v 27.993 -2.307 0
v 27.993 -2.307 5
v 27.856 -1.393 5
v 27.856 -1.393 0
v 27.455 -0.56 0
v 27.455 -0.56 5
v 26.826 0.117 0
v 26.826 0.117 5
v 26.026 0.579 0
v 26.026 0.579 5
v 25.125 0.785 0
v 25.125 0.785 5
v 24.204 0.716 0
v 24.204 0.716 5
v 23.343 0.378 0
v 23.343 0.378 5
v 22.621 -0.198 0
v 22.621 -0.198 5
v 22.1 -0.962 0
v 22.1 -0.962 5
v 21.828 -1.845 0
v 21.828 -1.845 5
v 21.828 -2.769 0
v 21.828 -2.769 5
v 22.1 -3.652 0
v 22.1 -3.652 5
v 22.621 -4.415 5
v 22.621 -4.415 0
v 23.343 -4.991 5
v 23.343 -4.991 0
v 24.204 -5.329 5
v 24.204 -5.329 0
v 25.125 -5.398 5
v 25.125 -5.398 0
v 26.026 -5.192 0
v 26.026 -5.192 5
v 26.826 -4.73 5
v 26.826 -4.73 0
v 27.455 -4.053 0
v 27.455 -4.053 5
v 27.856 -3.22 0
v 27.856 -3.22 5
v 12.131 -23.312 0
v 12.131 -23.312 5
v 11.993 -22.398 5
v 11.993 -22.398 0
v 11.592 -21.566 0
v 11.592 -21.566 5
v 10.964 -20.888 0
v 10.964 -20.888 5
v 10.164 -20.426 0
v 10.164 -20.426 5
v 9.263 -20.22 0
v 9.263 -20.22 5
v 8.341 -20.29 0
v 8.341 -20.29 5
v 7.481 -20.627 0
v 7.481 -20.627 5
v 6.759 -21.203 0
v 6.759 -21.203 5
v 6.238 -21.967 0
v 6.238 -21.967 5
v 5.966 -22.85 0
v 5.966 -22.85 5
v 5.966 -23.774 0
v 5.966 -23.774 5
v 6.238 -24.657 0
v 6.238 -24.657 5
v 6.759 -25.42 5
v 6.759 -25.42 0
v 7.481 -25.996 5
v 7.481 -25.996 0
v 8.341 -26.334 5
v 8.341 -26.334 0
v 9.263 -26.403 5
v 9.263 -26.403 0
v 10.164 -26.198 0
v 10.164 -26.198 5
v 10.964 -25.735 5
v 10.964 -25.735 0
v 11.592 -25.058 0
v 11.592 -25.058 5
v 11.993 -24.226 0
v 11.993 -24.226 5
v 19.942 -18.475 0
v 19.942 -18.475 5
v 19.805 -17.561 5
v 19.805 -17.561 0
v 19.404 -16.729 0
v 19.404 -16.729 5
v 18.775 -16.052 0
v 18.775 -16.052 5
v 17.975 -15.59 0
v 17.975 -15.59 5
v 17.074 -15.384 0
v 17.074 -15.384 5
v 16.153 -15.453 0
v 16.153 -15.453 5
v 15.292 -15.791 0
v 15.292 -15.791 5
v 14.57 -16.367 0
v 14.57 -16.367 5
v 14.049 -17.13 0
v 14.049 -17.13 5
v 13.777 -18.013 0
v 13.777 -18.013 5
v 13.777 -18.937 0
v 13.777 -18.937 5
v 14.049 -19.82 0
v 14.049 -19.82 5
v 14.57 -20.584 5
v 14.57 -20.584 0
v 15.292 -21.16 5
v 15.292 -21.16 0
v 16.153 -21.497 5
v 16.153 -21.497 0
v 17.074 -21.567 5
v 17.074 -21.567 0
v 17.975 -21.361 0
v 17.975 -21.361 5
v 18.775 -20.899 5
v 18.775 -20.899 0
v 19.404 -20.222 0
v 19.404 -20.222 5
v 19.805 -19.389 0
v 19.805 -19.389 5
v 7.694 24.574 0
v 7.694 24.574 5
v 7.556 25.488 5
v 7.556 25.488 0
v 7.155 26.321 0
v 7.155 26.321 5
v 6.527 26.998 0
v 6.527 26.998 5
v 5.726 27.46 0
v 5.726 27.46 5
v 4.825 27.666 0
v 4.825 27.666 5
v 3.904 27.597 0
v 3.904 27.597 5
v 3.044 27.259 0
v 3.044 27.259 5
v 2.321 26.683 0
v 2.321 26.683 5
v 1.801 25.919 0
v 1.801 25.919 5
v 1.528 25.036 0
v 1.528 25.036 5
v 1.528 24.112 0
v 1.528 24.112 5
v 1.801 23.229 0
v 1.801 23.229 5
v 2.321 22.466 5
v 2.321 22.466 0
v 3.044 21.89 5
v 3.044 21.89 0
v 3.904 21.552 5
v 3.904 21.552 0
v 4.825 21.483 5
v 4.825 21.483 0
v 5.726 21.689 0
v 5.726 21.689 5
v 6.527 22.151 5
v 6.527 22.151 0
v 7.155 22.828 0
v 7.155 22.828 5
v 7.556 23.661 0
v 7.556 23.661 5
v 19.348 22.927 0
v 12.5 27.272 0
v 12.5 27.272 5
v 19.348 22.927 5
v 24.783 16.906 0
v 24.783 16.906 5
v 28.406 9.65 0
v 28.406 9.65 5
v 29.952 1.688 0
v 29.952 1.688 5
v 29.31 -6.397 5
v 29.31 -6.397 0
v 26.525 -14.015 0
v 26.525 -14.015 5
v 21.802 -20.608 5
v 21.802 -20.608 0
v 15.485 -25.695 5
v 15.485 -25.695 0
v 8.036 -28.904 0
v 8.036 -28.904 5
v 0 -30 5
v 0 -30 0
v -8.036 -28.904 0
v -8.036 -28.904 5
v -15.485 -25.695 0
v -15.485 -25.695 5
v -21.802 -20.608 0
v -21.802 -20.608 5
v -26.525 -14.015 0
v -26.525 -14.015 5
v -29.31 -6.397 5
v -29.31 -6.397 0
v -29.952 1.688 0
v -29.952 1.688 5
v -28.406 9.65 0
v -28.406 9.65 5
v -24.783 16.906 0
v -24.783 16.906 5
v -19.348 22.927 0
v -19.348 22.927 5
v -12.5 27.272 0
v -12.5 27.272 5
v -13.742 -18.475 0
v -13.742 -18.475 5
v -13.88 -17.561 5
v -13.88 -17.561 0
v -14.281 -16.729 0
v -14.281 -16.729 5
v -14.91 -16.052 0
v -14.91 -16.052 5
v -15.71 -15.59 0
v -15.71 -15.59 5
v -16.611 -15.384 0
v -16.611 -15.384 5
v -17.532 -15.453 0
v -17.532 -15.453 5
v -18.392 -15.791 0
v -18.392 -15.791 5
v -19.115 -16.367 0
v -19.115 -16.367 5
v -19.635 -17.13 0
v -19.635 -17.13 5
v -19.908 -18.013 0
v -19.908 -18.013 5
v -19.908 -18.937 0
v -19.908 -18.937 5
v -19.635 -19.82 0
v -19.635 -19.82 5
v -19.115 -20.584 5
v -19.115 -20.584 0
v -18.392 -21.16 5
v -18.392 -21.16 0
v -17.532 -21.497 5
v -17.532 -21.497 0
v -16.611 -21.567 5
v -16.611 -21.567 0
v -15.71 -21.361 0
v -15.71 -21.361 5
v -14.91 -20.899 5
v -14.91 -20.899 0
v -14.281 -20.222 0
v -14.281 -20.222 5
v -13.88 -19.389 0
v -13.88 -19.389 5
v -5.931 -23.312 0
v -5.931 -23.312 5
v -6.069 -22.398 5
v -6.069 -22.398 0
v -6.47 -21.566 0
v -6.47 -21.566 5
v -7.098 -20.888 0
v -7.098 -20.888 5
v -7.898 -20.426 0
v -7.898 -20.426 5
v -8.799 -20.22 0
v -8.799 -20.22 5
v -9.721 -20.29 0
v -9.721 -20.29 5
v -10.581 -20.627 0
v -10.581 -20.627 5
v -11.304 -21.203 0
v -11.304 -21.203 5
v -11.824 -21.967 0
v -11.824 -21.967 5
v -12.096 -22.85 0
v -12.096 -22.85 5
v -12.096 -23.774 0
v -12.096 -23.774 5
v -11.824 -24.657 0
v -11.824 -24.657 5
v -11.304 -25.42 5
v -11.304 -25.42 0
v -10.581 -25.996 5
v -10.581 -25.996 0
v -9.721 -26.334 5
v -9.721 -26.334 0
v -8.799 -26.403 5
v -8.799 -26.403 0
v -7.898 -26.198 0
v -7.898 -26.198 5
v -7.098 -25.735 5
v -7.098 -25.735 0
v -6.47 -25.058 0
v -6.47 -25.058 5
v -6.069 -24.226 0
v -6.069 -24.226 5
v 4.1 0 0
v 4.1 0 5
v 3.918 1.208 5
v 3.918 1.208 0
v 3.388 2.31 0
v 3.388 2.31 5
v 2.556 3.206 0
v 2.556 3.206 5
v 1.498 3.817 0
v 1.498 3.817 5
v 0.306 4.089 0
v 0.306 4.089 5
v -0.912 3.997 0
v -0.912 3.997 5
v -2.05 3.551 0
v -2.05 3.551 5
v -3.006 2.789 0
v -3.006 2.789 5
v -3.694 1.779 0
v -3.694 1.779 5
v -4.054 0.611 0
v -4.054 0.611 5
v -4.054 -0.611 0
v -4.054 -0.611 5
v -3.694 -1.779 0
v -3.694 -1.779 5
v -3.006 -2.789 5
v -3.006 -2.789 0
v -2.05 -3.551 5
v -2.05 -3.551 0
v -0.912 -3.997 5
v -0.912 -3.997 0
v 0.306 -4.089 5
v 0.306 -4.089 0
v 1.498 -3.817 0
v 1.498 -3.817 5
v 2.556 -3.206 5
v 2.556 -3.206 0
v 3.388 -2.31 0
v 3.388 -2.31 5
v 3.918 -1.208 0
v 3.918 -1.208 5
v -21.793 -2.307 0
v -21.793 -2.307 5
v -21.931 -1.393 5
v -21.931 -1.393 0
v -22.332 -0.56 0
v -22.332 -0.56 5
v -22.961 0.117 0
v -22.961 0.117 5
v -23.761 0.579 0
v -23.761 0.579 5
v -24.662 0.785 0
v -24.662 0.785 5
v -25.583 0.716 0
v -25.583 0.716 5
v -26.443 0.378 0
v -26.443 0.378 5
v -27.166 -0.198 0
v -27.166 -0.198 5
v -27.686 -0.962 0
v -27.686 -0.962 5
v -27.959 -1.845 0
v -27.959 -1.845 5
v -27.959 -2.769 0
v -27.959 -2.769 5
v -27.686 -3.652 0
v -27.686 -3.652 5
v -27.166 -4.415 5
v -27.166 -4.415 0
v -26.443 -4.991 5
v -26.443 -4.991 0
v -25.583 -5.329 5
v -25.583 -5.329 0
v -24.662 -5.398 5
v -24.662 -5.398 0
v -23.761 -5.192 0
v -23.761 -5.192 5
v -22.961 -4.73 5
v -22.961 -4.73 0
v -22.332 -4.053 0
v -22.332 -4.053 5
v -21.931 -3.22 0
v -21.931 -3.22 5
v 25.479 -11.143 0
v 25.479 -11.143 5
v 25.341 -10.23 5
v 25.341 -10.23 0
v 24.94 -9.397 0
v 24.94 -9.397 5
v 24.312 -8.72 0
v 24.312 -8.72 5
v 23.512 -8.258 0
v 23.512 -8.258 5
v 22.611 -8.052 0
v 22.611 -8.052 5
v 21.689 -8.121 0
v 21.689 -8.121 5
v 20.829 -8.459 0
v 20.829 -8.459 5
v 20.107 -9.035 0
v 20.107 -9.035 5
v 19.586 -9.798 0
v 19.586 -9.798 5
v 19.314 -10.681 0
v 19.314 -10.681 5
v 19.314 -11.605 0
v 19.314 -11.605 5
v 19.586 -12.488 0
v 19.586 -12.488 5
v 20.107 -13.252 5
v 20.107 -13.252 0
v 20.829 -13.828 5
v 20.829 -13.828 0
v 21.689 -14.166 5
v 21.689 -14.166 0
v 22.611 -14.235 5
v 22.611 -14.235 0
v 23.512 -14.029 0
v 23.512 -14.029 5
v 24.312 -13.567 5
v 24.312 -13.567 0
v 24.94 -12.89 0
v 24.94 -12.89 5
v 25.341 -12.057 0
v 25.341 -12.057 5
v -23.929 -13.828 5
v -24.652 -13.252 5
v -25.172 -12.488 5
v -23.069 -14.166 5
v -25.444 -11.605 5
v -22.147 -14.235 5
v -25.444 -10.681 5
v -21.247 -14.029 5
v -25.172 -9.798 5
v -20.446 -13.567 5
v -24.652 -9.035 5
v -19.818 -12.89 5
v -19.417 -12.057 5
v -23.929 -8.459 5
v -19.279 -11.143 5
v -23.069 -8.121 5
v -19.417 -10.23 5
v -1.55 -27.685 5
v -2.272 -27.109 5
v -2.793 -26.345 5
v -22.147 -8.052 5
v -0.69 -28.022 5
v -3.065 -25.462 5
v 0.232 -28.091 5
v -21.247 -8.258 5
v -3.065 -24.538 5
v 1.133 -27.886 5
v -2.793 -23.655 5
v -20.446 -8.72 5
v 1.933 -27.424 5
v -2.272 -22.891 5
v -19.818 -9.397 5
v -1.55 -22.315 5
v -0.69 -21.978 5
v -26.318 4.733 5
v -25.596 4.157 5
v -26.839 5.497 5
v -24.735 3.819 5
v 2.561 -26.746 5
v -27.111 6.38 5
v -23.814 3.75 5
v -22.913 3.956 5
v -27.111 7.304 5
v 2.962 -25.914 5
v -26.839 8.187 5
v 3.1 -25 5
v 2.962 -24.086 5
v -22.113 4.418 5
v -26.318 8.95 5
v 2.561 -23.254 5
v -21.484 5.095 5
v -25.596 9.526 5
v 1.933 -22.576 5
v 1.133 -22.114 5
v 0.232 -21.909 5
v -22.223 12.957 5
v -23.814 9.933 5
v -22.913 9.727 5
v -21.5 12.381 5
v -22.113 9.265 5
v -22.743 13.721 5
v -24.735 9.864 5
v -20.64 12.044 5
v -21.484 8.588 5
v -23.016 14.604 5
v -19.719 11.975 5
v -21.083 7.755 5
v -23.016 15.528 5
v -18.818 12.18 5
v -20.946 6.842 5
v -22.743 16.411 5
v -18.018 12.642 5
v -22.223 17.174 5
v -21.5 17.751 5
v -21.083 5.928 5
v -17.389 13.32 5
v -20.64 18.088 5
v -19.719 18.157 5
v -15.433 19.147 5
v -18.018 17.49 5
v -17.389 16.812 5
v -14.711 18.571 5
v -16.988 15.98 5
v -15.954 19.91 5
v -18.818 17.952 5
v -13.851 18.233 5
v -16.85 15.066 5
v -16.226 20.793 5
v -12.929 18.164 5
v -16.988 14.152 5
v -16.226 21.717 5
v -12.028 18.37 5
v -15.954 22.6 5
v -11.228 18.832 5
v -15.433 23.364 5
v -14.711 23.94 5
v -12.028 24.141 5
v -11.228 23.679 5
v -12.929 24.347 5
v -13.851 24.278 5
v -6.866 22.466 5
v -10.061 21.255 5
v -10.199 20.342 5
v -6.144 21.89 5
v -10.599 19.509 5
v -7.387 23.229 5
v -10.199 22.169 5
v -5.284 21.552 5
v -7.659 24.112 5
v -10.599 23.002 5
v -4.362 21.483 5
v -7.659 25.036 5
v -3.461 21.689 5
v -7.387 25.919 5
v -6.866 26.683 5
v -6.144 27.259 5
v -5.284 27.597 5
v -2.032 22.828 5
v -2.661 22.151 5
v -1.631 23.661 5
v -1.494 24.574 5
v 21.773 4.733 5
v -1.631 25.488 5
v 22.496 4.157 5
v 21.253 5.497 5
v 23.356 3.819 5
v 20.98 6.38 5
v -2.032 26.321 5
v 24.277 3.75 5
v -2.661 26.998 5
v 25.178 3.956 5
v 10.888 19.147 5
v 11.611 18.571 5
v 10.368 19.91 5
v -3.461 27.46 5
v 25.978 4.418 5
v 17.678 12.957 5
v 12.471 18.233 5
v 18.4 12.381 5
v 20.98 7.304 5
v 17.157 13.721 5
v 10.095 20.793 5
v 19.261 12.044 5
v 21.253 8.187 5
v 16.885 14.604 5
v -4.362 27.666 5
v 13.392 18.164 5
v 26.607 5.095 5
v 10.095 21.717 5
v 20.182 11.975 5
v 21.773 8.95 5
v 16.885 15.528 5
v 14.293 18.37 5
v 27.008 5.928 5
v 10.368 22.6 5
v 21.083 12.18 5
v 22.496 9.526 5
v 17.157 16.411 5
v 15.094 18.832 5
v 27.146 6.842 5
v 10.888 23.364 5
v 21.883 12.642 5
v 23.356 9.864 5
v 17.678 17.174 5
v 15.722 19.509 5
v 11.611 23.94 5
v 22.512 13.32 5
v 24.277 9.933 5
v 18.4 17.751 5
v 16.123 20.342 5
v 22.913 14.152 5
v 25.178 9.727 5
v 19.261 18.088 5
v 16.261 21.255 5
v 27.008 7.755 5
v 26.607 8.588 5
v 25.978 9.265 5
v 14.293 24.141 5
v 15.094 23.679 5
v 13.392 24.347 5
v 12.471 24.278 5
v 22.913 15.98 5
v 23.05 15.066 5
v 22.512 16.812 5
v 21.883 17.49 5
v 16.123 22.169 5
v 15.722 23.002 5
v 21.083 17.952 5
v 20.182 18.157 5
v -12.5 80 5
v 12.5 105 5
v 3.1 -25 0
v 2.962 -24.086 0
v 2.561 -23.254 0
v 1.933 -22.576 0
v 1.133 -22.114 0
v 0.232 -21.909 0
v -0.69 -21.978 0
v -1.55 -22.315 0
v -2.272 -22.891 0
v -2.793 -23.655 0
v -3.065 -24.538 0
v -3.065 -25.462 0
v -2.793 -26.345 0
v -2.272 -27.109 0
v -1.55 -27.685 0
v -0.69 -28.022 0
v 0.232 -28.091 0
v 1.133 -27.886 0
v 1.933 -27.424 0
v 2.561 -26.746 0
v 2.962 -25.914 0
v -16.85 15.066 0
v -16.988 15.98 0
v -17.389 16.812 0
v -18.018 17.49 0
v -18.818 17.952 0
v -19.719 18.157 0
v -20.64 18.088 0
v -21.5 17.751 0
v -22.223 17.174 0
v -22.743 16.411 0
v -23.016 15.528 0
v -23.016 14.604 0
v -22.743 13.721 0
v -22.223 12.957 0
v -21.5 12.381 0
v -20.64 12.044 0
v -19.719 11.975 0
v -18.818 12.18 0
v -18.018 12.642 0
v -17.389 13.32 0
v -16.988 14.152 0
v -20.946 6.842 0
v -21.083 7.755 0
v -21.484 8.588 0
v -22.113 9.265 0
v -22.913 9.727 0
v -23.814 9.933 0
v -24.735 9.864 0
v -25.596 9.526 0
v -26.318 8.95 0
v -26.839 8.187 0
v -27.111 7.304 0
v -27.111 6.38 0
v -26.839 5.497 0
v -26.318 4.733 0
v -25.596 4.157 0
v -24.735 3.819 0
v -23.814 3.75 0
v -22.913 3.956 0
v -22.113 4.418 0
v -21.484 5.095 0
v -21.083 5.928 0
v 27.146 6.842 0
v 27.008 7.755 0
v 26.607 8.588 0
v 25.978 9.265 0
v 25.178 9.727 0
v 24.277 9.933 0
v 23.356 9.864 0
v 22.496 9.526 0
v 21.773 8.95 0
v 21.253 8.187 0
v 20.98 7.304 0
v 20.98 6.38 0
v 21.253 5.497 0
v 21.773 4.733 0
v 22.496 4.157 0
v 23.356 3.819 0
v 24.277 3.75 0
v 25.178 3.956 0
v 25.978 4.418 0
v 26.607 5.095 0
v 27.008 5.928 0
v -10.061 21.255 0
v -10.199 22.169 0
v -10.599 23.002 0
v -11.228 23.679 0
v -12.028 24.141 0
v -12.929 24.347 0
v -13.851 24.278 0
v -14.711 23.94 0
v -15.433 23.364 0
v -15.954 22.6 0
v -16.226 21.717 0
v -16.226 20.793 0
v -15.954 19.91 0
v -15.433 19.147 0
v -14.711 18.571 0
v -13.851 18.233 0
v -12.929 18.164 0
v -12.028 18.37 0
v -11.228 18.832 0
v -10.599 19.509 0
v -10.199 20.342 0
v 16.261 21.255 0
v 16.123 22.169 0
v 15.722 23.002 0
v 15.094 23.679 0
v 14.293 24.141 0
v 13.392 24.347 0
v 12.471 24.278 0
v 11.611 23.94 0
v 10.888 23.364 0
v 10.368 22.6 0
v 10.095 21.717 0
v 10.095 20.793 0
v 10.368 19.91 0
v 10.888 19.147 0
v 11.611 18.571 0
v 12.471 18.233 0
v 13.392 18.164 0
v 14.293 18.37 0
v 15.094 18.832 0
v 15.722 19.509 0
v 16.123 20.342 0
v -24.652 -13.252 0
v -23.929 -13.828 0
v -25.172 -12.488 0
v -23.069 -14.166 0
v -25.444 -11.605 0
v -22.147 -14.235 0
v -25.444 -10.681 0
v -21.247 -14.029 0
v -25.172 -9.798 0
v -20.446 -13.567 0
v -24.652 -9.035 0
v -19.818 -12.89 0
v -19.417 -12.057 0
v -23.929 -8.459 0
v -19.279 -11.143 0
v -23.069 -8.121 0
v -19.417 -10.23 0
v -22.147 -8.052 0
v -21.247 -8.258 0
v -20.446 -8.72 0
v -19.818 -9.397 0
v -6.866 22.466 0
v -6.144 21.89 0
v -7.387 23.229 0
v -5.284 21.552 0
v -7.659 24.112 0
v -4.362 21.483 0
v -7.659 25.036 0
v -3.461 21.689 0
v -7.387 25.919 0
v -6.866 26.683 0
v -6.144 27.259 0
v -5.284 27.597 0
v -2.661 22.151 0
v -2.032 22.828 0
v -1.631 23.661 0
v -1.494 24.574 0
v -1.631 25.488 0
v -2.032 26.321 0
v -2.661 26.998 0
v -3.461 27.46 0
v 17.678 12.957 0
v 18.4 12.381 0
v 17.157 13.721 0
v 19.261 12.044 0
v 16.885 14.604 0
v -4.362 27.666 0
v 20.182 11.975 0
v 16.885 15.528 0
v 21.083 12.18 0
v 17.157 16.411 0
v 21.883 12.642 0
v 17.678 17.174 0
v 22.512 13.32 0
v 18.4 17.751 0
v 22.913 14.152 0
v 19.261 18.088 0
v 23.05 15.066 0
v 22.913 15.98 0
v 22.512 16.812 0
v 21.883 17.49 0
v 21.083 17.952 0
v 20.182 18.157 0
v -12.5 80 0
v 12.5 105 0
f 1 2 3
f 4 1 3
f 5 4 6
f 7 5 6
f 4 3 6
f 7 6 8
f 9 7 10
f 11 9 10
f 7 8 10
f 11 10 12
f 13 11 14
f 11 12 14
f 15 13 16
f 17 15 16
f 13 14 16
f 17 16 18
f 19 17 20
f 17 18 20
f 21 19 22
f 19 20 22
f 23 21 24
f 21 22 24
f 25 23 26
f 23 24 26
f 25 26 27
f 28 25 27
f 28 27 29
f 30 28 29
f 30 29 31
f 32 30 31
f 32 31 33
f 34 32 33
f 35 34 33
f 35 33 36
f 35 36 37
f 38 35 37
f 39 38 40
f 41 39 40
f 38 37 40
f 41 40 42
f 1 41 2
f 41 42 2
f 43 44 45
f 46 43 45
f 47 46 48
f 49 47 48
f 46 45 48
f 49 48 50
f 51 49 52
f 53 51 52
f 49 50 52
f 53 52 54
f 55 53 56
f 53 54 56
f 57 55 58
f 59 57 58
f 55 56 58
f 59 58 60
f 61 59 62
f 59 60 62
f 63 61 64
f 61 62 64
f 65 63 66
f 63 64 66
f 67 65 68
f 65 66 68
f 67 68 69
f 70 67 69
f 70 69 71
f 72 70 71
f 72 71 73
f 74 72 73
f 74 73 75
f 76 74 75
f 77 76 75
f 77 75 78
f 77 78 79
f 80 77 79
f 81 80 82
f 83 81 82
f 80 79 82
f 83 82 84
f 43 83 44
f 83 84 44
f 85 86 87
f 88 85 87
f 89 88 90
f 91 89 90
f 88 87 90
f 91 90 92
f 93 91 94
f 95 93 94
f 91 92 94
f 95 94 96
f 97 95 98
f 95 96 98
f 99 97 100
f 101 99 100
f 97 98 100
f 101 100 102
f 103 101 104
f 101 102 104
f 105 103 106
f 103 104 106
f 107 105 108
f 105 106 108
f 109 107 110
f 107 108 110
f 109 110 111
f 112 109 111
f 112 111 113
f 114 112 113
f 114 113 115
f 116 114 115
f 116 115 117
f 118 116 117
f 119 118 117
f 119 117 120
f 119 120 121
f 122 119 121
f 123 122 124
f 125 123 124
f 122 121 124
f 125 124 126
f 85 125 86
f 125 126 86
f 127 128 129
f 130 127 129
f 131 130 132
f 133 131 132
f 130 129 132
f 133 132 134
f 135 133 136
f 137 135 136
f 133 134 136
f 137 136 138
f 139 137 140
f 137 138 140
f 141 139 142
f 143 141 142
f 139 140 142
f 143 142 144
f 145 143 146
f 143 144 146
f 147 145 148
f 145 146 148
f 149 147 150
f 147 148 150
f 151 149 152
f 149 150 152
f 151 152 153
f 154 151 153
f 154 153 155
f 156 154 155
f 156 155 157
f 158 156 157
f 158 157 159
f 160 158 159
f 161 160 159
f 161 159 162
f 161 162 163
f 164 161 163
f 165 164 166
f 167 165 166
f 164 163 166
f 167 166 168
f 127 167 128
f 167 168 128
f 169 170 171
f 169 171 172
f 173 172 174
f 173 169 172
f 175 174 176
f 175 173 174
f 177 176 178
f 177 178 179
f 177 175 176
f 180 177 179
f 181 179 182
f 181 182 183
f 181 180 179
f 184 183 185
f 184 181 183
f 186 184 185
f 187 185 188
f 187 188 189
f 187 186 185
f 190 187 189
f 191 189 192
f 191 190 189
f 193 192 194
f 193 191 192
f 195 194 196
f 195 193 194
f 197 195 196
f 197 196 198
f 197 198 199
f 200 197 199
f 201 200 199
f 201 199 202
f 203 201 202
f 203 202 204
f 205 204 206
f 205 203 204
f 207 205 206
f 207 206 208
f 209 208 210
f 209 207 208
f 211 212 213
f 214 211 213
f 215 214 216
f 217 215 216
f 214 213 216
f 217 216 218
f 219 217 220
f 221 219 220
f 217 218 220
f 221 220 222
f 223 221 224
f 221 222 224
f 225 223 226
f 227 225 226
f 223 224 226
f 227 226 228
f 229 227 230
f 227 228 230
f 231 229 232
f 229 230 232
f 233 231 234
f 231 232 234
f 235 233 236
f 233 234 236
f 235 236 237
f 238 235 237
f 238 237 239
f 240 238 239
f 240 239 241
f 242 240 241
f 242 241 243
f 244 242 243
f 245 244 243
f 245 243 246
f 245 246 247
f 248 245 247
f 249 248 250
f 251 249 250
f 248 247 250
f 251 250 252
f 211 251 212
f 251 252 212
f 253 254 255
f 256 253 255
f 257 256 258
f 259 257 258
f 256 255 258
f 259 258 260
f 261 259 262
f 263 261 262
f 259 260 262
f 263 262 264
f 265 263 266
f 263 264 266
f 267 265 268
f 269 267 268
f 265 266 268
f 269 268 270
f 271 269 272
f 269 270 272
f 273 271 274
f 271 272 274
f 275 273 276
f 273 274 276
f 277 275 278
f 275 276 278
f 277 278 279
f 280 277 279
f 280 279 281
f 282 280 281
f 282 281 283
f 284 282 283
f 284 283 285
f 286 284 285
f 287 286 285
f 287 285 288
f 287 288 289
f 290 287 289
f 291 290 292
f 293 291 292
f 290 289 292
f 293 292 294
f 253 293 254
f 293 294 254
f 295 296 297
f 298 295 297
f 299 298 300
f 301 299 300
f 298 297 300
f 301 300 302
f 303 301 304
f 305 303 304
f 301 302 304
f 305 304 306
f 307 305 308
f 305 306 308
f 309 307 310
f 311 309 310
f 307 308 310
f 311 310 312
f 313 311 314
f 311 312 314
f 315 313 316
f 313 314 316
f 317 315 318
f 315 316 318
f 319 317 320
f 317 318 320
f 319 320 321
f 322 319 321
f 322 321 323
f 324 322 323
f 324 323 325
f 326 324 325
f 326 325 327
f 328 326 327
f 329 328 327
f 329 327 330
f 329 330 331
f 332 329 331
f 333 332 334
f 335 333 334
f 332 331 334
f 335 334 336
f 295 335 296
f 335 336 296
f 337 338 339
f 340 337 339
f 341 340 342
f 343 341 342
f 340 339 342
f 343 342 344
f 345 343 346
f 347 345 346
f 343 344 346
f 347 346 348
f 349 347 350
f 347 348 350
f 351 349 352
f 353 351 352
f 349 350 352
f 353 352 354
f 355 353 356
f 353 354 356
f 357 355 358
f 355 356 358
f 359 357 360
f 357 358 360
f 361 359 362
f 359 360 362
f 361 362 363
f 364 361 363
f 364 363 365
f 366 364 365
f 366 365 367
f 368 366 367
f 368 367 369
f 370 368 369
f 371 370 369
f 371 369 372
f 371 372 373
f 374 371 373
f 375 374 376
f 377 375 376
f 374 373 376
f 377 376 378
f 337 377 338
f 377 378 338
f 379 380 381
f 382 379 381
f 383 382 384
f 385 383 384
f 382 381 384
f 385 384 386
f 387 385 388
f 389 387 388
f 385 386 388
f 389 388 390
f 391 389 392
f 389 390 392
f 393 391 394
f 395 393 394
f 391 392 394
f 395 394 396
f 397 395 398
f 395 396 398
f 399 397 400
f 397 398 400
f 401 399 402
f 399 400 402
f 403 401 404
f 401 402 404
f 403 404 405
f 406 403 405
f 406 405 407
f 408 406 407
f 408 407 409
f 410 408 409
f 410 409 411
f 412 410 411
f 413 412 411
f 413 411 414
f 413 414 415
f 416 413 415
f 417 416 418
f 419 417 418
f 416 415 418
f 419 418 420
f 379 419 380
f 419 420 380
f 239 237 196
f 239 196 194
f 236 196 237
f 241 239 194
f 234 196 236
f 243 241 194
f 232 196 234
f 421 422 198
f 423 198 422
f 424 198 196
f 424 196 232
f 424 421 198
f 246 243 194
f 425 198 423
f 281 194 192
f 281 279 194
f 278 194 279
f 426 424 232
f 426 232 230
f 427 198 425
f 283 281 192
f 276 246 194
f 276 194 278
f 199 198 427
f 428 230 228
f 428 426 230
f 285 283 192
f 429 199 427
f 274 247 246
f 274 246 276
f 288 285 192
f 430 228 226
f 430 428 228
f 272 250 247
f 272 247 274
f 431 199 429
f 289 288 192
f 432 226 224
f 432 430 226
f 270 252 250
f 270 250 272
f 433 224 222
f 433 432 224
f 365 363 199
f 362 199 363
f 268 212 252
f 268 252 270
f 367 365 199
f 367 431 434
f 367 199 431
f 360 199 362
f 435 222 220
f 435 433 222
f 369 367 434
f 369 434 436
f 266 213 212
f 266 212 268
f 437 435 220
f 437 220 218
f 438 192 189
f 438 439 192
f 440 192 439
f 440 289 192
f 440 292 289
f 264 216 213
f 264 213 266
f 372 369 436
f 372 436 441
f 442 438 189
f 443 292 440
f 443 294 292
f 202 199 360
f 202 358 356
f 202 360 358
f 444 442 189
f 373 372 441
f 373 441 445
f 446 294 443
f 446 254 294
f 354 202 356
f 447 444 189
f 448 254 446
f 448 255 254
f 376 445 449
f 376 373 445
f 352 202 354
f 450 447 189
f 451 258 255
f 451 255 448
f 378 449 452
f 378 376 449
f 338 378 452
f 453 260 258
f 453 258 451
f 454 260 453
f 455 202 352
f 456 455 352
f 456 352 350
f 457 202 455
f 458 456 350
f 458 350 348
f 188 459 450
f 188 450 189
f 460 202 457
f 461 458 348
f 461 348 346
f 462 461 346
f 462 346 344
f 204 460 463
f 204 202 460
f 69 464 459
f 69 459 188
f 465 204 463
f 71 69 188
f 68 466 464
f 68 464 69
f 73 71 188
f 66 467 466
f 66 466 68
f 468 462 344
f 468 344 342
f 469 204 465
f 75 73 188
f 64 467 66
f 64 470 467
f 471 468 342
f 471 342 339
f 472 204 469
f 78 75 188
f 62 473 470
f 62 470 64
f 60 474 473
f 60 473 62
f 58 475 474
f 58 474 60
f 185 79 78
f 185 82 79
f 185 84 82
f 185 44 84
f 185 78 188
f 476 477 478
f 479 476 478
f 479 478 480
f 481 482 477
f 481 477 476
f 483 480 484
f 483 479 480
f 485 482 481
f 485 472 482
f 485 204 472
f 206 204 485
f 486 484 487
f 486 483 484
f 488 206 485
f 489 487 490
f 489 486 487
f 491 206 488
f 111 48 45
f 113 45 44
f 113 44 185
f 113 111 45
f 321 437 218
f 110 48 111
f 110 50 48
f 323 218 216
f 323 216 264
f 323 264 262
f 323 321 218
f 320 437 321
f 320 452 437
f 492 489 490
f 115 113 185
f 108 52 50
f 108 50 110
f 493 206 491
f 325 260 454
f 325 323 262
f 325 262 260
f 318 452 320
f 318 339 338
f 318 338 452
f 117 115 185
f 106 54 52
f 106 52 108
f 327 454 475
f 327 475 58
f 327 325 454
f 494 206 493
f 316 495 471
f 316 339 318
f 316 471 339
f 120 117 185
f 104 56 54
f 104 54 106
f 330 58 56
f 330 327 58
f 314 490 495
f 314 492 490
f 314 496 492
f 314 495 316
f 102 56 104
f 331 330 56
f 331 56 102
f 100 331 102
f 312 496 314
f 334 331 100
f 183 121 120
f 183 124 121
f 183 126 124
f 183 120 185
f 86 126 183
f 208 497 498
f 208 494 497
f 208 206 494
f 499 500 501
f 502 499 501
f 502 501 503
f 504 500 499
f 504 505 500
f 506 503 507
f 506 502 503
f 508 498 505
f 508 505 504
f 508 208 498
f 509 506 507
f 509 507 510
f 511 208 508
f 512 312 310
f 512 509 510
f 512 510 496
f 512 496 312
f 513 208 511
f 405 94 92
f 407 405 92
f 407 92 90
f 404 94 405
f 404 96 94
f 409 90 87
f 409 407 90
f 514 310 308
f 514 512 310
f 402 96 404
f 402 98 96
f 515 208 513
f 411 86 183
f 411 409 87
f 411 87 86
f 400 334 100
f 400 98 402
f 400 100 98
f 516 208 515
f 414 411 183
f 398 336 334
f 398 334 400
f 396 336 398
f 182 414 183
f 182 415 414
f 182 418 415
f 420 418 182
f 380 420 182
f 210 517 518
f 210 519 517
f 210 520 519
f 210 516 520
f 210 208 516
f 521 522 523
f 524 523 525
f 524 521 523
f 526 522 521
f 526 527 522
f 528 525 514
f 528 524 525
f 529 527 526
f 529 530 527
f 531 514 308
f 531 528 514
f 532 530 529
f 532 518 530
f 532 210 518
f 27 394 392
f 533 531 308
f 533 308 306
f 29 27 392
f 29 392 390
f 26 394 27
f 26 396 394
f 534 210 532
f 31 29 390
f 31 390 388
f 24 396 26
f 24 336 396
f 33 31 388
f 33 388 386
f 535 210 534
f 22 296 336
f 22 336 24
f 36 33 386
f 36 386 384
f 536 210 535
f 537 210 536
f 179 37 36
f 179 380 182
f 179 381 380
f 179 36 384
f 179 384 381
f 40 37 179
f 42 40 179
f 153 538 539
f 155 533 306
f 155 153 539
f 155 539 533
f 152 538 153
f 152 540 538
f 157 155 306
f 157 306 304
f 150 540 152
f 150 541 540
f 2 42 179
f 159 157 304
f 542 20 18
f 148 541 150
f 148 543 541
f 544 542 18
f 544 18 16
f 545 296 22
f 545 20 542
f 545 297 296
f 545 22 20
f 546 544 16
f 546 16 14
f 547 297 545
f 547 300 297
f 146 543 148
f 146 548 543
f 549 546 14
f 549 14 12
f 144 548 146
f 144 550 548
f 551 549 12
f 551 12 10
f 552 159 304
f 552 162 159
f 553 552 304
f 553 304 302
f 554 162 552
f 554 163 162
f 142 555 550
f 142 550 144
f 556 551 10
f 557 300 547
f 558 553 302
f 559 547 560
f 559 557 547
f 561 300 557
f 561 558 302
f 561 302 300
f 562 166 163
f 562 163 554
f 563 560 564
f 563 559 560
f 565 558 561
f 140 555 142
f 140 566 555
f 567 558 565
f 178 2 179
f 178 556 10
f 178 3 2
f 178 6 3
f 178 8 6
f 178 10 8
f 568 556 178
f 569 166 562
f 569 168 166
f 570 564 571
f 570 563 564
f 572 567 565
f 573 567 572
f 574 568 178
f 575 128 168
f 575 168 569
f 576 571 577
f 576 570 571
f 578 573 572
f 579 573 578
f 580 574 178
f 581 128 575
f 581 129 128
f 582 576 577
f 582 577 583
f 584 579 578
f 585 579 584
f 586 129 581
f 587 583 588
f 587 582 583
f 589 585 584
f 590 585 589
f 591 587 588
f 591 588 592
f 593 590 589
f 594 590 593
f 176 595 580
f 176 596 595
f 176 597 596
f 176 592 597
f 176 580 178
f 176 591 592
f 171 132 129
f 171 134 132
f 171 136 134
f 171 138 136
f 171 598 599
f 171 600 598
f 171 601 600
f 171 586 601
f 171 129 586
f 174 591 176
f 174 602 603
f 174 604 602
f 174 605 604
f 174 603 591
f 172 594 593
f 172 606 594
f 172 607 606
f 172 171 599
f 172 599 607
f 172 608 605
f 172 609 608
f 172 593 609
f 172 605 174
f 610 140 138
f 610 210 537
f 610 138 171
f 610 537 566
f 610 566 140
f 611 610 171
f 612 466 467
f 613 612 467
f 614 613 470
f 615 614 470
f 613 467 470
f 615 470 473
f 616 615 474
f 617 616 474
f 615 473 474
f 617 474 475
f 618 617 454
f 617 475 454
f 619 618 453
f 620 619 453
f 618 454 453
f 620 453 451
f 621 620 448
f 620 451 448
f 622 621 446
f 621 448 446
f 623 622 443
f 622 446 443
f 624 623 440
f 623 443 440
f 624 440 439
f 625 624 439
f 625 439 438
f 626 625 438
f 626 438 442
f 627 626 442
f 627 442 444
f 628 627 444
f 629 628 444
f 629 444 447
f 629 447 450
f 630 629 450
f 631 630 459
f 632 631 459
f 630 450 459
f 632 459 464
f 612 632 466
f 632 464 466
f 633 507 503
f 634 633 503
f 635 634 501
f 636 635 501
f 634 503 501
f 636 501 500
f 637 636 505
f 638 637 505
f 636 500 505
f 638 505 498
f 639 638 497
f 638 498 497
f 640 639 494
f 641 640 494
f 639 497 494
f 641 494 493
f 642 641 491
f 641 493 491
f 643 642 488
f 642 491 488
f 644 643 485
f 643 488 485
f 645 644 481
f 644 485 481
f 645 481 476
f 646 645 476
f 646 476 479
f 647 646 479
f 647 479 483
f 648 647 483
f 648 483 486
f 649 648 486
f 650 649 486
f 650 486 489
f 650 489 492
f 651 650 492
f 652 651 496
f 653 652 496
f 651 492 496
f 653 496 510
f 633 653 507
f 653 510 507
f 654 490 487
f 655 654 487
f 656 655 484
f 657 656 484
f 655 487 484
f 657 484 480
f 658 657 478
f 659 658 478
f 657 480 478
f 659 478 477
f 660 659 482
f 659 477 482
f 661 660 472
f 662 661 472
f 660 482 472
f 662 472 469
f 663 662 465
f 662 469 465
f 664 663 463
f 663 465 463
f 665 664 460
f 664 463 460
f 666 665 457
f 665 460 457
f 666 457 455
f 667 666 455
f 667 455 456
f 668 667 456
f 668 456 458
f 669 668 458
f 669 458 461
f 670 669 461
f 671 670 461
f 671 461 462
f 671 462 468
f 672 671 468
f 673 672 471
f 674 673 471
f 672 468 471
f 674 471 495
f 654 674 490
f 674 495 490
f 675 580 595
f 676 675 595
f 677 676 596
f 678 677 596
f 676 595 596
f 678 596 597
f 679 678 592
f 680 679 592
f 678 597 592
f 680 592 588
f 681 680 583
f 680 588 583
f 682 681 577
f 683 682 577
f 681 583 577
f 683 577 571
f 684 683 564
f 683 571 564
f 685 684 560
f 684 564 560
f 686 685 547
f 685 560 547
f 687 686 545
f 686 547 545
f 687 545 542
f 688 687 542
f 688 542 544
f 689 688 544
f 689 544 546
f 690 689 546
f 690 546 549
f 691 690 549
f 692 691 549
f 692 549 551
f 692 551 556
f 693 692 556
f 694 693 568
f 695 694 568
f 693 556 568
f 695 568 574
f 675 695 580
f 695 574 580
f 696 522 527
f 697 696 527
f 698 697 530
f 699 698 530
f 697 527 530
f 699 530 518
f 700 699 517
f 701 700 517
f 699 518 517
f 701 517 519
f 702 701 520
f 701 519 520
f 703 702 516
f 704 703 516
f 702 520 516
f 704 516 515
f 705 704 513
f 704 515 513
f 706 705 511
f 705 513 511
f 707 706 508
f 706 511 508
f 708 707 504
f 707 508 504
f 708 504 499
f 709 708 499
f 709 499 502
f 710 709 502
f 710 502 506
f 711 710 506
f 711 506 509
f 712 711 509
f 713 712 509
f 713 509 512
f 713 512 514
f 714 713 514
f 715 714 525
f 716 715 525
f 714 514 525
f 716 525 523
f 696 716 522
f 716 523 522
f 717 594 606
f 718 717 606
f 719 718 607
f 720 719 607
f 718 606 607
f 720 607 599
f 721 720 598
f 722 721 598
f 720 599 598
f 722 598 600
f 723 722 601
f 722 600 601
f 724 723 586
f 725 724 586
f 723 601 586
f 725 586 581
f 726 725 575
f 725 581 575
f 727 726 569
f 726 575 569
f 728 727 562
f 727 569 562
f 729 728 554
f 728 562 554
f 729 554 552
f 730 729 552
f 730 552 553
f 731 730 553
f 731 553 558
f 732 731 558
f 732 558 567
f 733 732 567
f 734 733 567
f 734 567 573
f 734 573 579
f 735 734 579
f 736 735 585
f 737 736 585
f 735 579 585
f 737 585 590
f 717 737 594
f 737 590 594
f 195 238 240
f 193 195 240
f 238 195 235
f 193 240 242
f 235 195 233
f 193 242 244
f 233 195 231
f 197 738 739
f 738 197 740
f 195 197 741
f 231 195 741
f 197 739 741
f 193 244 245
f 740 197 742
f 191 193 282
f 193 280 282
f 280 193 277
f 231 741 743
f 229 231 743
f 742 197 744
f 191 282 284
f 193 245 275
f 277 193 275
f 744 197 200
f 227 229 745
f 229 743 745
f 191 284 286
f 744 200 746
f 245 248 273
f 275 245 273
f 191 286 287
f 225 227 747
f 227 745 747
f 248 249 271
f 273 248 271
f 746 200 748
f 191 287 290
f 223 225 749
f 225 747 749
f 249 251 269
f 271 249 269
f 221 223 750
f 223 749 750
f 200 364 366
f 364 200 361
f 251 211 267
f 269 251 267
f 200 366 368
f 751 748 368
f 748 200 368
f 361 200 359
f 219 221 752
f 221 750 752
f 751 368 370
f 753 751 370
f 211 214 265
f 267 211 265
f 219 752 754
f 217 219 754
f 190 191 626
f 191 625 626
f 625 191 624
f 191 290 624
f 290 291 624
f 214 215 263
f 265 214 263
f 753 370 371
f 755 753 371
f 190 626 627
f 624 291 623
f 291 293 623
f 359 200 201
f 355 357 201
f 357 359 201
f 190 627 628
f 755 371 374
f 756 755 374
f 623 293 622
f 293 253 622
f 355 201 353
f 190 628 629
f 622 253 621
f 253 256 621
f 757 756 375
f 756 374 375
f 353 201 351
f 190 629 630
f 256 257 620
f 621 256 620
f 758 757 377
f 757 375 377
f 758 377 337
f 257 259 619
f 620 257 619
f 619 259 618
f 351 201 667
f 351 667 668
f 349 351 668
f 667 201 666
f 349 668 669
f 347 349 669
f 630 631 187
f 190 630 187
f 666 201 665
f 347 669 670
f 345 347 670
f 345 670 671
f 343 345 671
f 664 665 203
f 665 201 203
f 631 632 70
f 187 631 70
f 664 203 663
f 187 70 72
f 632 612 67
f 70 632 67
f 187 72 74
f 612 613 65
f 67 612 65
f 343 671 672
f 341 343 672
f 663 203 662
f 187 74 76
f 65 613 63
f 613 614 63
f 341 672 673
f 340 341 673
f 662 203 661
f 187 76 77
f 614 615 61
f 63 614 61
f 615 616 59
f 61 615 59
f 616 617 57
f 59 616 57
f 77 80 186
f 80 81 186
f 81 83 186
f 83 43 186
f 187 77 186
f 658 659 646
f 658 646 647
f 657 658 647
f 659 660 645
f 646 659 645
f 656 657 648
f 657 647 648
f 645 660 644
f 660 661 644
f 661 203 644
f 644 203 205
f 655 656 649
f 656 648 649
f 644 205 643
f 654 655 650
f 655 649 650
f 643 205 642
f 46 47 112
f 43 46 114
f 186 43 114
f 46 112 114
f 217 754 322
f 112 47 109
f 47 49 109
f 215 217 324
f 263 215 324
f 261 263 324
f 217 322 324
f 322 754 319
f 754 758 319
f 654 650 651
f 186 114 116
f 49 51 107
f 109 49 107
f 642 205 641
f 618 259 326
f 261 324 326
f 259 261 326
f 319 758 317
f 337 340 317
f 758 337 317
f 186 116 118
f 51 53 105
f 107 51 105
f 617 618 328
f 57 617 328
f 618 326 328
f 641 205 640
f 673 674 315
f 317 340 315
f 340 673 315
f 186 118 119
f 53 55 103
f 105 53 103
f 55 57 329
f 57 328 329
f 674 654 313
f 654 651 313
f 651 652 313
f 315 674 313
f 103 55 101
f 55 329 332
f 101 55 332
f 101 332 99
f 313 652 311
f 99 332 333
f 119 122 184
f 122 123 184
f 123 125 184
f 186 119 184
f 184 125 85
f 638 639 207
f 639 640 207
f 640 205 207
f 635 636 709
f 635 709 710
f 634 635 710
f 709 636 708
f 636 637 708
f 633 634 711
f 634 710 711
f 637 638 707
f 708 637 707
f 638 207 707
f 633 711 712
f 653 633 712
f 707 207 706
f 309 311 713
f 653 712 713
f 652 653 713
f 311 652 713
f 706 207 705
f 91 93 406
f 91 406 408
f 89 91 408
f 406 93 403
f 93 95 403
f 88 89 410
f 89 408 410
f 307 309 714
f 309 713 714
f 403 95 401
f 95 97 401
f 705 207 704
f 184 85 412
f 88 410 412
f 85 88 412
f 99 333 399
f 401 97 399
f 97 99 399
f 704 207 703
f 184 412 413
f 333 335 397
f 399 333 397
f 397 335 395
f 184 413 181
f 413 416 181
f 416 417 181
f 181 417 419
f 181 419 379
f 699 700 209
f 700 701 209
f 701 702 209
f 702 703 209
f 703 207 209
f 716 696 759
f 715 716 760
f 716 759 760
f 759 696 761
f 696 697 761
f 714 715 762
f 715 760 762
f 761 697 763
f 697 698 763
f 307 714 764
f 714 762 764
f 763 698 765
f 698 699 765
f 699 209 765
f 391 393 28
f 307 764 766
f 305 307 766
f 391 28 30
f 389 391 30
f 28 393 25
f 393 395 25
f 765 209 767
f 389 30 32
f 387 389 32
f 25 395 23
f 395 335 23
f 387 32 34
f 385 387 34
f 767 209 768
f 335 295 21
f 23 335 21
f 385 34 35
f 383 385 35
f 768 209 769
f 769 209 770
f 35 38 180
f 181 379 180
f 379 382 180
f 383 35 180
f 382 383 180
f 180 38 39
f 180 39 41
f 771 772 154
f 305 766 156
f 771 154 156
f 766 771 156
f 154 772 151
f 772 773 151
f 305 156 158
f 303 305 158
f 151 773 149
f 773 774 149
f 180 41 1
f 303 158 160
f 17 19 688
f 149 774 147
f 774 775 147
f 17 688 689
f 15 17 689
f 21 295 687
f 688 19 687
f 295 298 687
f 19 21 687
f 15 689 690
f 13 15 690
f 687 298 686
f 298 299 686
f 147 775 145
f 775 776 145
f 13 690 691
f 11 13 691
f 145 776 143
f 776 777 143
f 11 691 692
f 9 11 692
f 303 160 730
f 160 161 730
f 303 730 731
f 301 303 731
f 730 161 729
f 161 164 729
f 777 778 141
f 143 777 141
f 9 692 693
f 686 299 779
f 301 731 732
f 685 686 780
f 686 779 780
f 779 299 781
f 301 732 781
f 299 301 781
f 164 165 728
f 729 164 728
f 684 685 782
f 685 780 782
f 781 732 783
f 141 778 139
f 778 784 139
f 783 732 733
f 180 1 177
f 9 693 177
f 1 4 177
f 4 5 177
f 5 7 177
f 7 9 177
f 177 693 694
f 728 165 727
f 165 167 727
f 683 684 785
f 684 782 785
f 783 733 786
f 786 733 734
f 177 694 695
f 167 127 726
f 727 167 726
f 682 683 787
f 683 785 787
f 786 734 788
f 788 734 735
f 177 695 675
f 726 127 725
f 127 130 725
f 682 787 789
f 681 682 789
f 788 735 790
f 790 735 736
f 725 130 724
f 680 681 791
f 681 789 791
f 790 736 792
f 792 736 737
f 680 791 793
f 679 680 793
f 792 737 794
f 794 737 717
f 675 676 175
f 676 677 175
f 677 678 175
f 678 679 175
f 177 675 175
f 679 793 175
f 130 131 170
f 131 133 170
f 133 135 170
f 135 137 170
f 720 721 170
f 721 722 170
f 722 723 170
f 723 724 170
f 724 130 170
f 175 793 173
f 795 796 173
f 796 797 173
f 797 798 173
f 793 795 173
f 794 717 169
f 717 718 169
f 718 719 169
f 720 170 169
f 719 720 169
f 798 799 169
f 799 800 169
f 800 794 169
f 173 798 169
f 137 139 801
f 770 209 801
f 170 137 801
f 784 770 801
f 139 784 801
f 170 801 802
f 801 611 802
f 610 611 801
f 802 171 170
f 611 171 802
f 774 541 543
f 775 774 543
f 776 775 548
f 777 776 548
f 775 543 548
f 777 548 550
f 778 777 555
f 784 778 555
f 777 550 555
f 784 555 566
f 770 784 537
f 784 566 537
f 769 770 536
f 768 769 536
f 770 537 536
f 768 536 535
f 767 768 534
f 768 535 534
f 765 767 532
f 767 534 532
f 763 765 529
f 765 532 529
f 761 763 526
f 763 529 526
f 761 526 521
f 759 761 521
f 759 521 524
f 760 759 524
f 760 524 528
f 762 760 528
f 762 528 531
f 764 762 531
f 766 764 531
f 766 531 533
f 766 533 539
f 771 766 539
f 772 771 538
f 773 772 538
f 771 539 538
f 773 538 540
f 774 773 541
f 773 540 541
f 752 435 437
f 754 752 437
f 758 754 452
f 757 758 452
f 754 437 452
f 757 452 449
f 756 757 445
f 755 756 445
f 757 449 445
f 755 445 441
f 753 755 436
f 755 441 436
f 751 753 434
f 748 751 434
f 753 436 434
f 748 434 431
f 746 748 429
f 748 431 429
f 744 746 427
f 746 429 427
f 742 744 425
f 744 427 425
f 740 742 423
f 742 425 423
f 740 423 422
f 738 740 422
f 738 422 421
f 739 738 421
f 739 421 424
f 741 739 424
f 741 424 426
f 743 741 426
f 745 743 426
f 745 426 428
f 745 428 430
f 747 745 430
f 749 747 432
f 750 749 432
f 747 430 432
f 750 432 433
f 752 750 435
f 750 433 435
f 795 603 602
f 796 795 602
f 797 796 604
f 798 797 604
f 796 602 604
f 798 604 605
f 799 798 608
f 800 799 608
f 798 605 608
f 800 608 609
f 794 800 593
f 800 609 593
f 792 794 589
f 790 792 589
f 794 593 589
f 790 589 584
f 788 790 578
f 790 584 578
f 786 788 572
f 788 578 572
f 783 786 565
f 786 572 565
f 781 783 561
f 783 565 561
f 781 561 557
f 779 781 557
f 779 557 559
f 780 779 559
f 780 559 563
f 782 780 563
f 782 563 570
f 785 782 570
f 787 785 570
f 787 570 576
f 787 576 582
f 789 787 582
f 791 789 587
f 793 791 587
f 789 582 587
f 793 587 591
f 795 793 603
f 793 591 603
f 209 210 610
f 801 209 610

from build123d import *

# Parameters (mm, degrees)
EXTRUDE_3_DEPTH     = 5
SKETCH_12_W         = 25
SKETCH_12_H         = 25
CUT_EXTRUDE_2_DEPTH = 5
CUT_EXTRUDE_3_DEPTH = 5
SKETCH_14_R         = 4.1
CUT_EXTRUDE_4_DEPTH = 5
SKETCH_16_R         = 3.1
CUT_EXTRUDE_5_DEPTH = 5
CUT_EXTRUDE_6_DEPTH = 5
SKETCH_18_W         = 25
SKETCH_18_H         = 35
EXTRUDE_4_DEPTH     = 5
CUT_EXTRUDE_7_DEPTH = 5


with BuildPart() as part:
    # 草图8 → 凸台-拉伸3 (new body)
    with BuildSketch(Plane.XY):
        with BuildLine():
            Line((-12.5, 150), (12.5, 150))
            Line((12.5, 150), (12.5, 27.271780287))
            ThreePointArc((12.5, 27.271780287), (0, -30), (-12.5, 27.271780287))
            Line((-12.5, 27.271780287), (-12.5, 150))
        make_face()
    extrude(amount=EXTRUDE_3_DEPTH)

    # 草图12 → 切除-拉伸2 (cut)
    with BuildSketch(Plane.XY.offset(5)):
        with Locations((0, 137.5)):
            Rectangle(SKETCH_12_W, SKETCH_12_H)
    extrude(amount=-CUT_EXTRUDE_2_DEPTH, mode=Mode.SUBTRACT)

    # 草图13 → 切除-拉伸3 (cut)
    with BuildSketch(Plane.XY.offset(5)):
        Polygon((-12.5, 125), (12.5, 125), (-12.5, 100), align=None)
    extrude(amount=-CUT_EXTRUDE_3_DEPTH, mode=Mode.SUBTRACT)

    # 草图14 → 切除-拉伸4 (cut)
    with BuildSketch(Plane.XY.offset(5)):
        Circle(SKETCH_14_R)
    extrude(amount=-CUT_EXTRUDE_4_DEPTH, mode=Mode.SUBTRACT)

    # 草图16 → 切除-拉伸5 (cut)
    with BuildSketch(Plane.XY.offset(5)):
        with Locations((0, -25)):
            Circle(SKETCH_16_R)
        with Locations((-9.031041655, -23.311805735)):
            Circle(SKETCH_16_R)
        with Locations((-16.842391091, -18.475222931)):
            Circle(SKETCH_16_R)
        with Locations((-22.379082284, -11.143458894)):
            Circle(SKETCH_16_R)
        with Locations((-24.893354407, -2.306708987)):
            Circle(SKETCH_16_R)
        with Locations((-24.045641079, 6.841574752)):
            Circle(SKETCH_16_R)
        with Locations((-19.950430682, 15.065865909)):
            Circle(SKETCH_16_R)
        with Locations((-13.160804072, 21.255428393)):
            Circle(SKETCH_16_R)
        with Locations((-4.593737945, 24.574327492)):
            Circle(SKETCH_16_R)
        with Locations((4.593737945, 24.574327492)):
            Circle(SKETCH_16_R)
        with Locations((13.160804072, 21.255428393)):
            Circle(SKETCH_16_R)
        with Locations((19.950430682, 15.065865909)):
            Circle(SKETCH_16_R)
        with Locations((24.045641079, 6.841574752)):
            Circle(SKETCH_16_R)
        with Locations((24.893354407, -2.306708987)):
            Circle(SKETCH_16_R)
        with Locations((22.379082284, -11.143458894)):
            Circle(SKETCH_16_R)
        with Locations((16.842391091, -18.475222931)):
            Circle(SKETCH_16_R)
        with Locations((9.031041655, -23.311805735)):
            Circle(SKETCH_16_R)
    extrude(amount=-CUT_EXTRUDE_5_DEPTH, mode=Mode.SUBTRACT)

    # 草图17 → 切除-拉伸6 (cut)
    with BuildSketch(Plane.XY.offset(5)):
        Polygon((-12.5, 100), (12.5, 125), (12.5, 95), (-12.5, 70), align=None)
    extrude(amount=-CUT_EXTRUDE_6_DEPTH, mode=Mode.SUBTRACT)

    # 草图18 → 凸台-拉伸4 (add)
    with BuildSketch(Plane.XY.offset(5)):
        with Locations((0, 87.5)):
            Rectangle(SKETCH_18_W, SKETCH_18_H)
    extrude(amount=-EXTRUDE_4_DEPTH)

    # 草图19 → 切除-拉伸7 (cut)
    with BuildSketch(Plane.XY.offset(5)):
        Polygon((-12.5, 105), (12.5, 105), (-12.5, 80), align=None)
    extrude(amount=-CUT_EXTRUDE_7_DEPTH, mode=Mode.SUBTRACT)


solid = part.part
